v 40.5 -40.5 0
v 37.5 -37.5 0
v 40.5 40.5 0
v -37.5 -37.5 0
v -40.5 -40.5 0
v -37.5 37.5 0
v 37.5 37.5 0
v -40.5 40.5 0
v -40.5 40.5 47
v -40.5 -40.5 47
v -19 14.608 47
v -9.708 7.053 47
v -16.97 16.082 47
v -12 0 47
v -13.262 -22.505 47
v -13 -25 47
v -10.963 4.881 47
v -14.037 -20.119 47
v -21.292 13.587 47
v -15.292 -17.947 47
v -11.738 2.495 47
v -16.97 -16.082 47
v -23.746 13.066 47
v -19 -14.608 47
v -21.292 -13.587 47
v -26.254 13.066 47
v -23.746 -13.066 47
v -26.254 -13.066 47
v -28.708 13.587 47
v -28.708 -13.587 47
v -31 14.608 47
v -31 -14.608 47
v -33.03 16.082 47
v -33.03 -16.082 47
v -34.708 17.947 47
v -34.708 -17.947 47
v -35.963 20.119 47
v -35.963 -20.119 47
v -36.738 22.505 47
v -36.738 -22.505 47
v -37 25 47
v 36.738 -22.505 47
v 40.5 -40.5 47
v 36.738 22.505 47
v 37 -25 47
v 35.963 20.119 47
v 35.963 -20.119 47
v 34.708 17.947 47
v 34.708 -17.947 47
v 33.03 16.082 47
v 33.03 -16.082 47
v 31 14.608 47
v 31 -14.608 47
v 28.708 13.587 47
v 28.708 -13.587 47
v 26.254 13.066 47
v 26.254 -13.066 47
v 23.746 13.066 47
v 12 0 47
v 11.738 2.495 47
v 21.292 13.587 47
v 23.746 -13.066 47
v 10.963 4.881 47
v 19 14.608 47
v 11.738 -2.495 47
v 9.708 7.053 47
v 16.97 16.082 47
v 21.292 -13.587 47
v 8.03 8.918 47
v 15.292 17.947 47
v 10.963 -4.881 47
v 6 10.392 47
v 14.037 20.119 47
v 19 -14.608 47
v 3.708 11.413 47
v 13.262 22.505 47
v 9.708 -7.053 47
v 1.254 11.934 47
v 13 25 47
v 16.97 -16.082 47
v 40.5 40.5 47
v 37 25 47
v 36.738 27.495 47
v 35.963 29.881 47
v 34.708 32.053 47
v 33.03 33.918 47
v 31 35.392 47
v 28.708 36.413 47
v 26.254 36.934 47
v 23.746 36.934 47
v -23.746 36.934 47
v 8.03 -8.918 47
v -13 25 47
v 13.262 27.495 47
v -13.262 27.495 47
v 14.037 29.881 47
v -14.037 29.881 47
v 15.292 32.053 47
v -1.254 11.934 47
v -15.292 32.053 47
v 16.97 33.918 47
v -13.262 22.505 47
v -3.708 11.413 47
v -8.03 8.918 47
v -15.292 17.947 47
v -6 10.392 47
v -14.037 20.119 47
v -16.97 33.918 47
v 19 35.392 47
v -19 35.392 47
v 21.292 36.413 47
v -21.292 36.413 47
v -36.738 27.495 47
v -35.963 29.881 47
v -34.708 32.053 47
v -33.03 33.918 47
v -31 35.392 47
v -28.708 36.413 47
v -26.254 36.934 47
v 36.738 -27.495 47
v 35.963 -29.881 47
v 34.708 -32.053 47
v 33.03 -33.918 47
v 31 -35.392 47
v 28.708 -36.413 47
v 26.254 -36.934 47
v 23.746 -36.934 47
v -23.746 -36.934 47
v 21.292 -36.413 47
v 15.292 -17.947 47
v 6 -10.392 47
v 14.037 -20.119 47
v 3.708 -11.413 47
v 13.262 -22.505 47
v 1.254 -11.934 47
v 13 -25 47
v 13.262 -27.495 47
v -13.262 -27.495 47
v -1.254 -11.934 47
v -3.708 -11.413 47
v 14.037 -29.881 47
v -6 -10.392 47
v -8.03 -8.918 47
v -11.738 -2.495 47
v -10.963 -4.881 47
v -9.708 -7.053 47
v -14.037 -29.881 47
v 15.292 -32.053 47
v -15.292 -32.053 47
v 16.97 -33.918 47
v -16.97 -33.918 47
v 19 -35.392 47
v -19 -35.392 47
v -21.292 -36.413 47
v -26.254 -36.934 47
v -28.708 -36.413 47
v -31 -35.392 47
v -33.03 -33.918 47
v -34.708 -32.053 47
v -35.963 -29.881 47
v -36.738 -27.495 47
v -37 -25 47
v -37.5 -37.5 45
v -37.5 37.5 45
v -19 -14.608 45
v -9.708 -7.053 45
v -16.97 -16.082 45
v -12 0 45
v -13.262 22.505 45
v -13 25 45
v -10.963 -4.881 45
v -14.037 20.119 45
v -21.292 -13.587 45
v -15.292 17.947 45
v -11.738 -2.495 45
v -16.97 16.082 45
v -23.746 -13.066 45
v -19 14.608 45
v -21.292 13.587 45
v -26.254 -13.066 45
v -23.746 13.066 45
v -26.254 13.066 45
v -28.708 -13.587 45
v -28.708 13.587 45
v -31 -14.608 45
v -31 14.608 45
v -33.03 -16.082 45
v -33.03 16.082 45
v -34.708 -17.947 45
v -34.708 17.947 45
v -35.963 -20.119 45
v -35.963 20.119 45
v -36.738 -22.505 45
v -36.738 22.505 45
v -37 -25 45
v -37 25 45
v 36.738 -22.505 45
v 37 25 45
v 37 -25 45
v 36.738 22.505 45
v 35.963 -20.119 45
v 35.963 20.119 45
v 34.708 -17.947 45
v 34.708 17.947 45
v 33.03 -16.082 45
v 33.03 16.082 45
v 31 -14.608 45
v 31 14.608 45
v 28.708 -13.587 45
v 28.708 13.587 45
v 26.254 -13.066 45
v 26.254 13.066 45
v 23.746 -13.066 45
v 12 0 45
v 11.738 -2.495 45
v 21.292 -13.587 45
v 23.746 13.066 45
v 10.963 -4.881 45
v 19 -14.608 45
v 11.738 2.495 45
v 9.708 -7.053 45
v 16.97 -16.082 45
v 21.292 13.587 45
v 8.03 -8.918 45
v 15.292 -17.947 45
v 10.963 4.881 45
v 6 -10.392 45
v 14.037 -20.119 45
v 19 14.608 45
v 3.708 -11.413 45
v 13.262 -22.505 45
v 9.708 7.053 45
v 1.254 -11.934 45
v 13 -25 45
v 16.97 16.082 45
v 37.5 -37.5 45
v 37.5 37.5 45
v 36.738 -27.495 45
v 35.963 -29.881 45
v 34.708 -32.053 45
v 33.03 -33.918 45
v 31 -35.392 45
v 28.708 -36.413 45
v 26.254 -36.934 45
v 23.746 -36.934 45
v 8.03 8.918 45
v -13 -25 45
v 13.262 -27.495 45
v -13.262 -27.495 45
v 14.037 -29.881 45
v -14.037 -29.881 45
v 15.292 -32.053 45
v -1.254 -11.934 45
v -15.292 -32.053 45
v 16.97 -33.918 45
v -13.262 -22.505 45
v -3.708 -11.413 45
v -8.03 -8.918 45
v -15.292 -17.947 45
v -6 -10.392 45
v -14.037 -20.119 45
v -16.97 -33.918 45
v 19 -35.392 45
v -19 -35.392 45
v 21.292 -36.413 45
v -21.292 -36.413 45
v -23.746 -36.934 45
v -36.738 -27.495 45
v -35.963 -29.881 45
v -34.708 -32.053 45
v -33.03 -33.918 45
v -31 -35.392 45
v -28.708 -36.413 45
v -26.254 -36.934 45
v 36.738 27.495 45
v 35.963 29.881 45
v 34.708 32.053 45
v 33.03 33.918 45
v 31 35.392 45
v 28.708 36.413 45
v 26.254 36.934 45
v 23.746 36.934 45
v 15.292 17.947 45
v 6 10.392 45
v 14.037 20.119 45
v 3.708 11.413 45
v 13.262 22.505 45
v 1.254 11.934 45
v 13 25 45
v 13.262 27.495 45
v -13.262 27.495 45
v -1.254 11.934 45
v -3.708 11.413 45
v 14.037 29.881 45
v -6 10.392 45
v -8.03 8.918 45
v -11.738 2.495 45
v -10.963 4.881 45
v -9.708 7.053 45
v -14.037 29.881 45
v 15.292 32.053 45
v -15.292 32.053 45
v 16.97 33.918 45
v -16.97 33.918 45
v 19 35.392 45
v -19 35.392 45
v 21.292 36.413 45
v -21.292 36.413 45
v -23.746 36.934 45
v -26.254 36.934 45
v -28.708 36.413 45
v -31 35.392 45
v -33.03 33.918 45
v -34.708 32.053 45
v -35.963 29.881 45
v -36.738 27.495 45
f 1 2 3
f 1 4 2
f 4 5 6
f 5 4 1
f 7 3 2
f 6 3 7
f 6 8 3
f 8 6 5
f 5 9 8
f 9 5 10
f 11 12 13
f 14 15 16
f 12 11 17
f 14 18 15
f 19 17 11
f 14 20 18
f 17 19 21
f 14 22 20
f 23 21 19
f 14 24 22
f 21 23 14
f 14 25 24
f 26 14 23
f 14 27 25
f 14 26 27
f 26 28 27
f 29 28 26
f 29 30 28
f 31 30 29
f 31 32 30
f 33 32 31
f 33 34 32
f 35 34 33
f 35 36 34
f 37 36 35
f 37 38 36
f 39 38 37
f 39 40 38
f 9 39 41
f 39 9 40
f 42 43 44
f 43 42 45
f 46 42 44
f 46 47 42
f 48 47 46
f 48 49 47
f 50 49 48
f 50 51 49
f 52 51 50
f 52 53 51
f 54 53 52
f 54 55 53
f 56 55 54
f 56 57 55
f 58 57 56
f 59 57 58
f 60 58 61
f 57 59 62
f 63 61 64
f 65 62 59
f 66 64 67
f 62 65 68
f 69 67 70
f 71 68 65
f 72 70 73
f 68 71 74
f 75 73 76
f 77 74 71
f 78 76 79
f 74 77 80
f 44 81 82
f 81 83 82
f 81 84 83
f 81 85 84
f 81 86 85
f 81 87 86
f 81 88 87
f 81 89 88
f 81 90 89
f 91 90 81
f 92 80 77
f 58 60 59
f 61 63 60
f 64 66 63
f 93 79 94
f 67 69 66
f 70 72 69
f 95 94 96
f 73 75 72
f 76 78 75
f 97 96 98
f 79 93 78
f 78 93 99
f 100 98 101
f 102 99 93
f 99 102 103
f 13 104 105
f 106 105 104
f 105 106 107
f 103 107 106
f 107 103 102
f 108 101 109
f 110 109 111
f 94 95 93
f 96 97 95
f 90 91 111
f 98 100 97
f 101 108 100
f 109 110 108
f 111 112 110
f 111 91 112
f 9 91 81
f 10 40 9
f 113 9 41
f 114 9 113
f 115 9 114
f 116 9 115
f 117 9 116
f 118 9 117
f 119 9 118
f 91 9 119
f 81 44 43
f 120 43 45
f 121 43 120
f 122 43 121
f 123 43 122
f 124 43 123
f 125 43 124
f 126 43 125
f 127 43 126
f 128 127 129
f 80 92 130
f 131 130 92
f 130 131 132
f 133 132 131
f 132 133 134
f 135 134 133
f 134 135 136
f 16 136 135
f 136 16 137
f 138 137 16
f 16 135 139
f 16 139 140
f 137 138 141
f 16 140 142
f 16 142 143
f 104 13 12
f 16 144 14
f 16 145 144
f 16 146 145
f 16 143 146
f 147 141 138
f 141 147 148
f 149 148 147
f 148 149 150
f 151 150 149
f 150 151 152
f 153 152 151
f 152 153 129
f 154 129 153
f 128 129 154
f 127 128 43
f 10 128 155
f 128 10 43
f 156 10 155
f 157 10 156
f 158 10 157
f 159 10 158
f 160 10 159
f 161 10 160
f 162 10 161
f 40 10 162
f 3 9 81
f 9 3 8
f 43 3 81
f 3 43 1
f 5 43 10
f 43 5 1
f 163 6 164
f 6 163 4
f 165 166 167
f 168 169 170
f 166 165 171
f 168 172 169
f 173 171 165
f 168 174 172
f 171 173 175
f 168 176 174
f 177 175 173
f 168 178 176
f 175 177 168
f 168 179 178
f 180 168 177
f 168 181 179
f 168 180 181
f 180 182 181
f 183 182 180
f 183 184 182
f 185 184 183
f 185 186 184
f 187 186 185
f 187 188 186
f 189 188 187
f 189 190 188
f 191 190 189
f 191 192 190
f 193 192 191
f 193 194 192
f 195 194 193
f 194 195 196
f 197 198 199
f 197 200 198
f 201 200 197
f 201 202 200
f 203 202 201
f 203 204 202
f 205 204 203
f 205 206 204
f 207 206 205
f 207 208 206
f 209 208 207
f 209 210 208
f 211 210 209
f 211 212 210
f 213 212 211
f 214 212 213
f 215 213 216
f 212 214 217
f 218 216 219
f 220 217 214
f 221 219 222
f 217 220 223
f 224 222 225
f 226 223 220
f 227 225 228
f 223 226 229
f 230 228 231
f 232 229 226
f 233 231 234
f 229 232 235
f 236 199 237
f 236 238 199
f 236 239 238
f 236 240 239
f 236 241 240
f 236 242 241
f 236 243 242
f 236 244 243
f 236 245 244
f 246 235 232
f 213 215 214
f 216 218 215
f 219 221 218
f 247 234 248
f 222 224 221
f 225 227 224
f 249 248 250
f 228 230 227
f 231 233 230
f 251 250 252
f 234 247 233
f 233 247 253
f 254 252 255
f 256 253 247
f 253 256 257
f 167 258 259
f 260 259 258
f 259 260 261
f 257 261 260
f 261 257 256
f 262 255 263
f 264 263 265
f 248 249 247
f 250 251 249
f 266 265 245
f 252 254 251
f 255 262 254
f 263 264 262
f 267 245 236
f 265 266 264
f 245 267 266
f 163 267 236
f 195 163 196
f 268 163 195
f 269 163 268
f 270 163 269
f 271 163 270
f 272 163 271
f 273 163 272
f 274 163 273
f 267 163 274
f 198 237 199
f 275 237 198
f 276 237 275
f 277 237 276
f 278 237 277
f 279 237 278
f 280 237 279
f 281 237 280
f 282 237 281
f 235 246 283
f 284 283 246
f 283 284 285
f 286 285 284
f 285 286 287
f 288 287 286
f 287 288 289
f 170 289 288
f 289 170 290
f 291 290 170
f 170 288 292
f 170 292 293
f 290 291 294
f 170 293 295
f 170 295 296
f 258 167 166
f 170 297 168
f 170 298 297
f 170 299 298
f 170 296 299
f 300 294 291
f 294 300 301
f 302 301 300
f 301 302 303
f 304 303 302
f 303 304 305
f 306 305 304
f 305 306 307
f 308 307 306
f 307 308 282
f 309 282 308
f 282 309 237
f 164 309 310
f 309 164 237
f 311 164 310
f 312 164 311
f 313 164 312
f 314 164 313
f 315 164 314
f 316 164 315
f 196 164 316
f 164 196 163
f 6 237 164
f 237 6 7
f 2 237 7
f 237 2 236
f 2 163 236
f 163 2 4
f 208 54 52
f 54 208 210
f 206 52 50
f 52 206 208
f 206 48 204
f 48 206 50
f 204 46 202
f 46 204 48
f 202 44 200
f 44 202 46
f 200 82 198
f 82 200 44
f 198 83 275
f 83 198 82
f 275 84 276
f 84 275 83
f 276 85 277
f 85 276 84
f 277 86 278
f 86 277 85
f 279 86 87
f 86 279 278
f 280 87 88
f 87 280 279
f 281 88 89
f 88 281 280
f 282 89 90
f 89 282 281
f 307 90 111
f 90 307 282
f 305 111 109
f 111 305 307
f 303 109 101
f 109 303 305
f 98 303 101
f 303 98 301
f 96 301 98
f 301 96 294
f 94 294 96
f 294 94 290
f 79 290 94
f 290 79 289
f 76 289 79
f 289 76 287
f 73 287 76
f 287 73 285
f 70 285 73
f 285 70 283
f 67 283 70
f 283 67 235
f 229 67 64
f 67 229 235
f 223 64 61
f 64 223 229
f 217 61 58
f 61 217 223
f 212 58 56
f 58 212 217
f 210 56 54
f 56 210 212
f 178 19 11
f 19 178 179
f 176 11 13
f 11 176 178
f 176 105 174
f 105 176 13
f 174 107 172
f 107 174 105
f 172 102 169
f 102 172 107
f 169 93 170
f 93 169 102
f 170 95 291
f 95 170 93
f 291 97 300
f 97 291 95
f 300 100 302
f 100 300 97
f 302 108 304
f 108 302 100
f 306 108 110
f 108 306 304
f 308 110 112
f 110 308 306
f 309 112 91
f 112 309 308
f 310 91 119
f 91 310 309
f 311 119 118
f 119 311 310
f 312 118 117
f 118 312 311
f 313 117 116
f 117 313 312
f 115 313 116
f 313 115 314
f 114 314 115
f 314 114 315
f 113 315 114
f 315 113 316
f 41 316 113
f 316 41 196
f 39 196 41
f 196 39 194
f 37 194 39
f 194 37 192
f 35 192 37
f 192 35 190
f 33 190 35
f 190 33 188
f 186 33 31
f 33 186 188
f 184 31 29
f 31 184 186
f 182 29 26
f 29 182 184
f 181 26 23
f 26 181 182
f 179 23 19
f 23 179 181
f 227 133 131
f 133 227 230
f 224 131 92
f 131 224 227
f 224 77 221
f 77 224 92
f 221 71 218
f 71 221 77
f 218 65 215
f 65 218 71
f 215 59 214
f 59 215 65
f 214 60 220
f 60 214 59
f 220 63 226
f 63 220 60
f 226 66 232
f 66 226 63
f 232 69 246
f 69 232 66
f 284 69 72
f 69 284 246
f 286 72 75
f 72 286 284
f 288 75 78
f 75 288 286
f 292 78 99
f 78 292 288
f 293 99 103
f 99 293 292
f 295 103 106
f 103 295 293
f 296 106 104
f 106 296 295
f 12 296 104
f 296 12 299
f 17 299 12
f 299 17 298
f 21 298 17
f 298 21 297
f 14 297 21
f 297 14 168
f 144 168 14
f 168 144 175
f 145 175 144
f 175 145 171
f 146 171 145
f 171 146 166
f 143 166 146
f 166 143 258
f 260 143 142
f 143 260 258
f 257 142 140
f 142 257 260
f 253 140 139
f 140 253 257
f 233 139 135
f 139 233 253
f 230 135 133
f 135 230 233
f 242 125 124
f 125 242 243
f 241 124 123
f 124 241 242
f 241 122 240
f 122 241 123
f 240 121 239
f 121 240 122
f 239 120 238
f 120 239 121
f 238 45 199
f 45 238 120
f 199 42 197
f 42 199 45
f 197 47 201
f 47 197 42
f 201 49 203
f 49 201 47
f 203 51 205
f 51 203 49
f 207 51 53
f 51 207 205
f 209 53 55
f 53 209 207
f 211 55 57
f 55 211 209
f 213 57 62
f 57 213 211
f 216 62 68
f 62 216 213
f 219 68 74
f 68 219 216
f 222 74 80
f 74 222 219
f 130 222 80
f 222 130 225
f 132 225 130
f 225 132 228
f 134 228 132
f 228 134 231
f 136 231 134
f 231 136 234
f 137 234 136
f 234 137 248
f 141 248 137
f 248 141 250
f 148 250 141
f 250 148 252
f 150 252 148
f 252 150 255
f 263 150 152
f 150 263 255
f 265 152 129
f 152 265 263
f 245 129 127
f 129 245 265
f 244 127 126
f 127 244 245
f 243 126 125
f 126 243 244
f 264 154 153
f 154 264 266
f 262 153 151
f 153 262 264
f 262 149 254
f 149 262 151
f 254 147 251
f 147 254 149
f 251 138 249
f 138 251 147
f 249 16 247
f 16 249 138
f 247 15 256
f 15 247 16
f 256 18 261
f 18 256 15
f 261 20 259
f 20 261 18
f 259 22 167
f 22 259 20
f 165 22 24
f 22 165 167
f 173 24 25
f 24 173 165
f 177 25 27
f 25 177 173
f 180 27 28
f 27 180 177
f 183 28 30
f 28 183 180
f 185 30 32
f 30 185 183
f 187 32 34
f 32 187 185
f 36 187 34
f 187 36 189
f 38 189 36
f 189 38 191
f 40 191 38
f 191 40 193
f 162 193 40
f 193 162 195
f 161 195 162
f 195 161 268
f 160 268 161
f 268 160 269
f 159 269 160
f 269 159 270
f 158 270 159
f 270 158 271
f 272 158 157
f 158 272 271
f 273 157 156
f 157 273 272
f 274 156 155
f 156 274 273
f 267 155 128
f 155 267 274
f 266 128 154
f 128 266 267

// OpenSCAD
button_radius = 12;
square_margin = 3;
side_length = 75;
top_height = 45;
top_margin = 2;
vertical_button_position = 25;
horizontal_button_position = 25;


module box(){
    difference(){ linear_extrude(height=top_height+top_margin) square(side_length + 2 * square_margin, center = true); linear_extrude(center=true, height=2*top_height) square(side_length, center = true);
}
}

module button_holes(){
    linear_extrude(height=2*top_height){
    circle(button_radius);
    translate([vertical_button_position, horizontal_button_position]) circle(button_radius);
    translate([vertical_button_position, -horizontal_button_position]) circle(button_radius);
    translate([-vertical_button_position, horizontal_button_position]) circle(button_radius);
    translate([-vertical_button_position, -horizontal_button_position]) circle(button_radius);
    }
}

module logo(){
    translate([0,0,top_height/2]) {
        rotate([90,0,90])linear_extrude(height=1.5*side_length) scale(0.15) translate([-108,-155,0]) import("utoss_logo.dxf",center=true);
        rotate([90,0,0])linear_extrude(height=1.5*side_length) scale(0.15) translate([-108,-155,0]) import("utoss_logo.dxf",center=true);
        rotate([-90,0,0])linear_extrude(height=1.5*side_length) scale(0.15) translate([-108,-155,0]) import("utoss_logo.dxf",center=true);
        rotate([90,0,-90])linear_extrude(height=1.5*side_length) scale(0.15) translate([-108,-155,0]) import("utoss_logo.dxf",center=true);
        }
}

difference(){
    box();
    button_holes();
    logo();
}
